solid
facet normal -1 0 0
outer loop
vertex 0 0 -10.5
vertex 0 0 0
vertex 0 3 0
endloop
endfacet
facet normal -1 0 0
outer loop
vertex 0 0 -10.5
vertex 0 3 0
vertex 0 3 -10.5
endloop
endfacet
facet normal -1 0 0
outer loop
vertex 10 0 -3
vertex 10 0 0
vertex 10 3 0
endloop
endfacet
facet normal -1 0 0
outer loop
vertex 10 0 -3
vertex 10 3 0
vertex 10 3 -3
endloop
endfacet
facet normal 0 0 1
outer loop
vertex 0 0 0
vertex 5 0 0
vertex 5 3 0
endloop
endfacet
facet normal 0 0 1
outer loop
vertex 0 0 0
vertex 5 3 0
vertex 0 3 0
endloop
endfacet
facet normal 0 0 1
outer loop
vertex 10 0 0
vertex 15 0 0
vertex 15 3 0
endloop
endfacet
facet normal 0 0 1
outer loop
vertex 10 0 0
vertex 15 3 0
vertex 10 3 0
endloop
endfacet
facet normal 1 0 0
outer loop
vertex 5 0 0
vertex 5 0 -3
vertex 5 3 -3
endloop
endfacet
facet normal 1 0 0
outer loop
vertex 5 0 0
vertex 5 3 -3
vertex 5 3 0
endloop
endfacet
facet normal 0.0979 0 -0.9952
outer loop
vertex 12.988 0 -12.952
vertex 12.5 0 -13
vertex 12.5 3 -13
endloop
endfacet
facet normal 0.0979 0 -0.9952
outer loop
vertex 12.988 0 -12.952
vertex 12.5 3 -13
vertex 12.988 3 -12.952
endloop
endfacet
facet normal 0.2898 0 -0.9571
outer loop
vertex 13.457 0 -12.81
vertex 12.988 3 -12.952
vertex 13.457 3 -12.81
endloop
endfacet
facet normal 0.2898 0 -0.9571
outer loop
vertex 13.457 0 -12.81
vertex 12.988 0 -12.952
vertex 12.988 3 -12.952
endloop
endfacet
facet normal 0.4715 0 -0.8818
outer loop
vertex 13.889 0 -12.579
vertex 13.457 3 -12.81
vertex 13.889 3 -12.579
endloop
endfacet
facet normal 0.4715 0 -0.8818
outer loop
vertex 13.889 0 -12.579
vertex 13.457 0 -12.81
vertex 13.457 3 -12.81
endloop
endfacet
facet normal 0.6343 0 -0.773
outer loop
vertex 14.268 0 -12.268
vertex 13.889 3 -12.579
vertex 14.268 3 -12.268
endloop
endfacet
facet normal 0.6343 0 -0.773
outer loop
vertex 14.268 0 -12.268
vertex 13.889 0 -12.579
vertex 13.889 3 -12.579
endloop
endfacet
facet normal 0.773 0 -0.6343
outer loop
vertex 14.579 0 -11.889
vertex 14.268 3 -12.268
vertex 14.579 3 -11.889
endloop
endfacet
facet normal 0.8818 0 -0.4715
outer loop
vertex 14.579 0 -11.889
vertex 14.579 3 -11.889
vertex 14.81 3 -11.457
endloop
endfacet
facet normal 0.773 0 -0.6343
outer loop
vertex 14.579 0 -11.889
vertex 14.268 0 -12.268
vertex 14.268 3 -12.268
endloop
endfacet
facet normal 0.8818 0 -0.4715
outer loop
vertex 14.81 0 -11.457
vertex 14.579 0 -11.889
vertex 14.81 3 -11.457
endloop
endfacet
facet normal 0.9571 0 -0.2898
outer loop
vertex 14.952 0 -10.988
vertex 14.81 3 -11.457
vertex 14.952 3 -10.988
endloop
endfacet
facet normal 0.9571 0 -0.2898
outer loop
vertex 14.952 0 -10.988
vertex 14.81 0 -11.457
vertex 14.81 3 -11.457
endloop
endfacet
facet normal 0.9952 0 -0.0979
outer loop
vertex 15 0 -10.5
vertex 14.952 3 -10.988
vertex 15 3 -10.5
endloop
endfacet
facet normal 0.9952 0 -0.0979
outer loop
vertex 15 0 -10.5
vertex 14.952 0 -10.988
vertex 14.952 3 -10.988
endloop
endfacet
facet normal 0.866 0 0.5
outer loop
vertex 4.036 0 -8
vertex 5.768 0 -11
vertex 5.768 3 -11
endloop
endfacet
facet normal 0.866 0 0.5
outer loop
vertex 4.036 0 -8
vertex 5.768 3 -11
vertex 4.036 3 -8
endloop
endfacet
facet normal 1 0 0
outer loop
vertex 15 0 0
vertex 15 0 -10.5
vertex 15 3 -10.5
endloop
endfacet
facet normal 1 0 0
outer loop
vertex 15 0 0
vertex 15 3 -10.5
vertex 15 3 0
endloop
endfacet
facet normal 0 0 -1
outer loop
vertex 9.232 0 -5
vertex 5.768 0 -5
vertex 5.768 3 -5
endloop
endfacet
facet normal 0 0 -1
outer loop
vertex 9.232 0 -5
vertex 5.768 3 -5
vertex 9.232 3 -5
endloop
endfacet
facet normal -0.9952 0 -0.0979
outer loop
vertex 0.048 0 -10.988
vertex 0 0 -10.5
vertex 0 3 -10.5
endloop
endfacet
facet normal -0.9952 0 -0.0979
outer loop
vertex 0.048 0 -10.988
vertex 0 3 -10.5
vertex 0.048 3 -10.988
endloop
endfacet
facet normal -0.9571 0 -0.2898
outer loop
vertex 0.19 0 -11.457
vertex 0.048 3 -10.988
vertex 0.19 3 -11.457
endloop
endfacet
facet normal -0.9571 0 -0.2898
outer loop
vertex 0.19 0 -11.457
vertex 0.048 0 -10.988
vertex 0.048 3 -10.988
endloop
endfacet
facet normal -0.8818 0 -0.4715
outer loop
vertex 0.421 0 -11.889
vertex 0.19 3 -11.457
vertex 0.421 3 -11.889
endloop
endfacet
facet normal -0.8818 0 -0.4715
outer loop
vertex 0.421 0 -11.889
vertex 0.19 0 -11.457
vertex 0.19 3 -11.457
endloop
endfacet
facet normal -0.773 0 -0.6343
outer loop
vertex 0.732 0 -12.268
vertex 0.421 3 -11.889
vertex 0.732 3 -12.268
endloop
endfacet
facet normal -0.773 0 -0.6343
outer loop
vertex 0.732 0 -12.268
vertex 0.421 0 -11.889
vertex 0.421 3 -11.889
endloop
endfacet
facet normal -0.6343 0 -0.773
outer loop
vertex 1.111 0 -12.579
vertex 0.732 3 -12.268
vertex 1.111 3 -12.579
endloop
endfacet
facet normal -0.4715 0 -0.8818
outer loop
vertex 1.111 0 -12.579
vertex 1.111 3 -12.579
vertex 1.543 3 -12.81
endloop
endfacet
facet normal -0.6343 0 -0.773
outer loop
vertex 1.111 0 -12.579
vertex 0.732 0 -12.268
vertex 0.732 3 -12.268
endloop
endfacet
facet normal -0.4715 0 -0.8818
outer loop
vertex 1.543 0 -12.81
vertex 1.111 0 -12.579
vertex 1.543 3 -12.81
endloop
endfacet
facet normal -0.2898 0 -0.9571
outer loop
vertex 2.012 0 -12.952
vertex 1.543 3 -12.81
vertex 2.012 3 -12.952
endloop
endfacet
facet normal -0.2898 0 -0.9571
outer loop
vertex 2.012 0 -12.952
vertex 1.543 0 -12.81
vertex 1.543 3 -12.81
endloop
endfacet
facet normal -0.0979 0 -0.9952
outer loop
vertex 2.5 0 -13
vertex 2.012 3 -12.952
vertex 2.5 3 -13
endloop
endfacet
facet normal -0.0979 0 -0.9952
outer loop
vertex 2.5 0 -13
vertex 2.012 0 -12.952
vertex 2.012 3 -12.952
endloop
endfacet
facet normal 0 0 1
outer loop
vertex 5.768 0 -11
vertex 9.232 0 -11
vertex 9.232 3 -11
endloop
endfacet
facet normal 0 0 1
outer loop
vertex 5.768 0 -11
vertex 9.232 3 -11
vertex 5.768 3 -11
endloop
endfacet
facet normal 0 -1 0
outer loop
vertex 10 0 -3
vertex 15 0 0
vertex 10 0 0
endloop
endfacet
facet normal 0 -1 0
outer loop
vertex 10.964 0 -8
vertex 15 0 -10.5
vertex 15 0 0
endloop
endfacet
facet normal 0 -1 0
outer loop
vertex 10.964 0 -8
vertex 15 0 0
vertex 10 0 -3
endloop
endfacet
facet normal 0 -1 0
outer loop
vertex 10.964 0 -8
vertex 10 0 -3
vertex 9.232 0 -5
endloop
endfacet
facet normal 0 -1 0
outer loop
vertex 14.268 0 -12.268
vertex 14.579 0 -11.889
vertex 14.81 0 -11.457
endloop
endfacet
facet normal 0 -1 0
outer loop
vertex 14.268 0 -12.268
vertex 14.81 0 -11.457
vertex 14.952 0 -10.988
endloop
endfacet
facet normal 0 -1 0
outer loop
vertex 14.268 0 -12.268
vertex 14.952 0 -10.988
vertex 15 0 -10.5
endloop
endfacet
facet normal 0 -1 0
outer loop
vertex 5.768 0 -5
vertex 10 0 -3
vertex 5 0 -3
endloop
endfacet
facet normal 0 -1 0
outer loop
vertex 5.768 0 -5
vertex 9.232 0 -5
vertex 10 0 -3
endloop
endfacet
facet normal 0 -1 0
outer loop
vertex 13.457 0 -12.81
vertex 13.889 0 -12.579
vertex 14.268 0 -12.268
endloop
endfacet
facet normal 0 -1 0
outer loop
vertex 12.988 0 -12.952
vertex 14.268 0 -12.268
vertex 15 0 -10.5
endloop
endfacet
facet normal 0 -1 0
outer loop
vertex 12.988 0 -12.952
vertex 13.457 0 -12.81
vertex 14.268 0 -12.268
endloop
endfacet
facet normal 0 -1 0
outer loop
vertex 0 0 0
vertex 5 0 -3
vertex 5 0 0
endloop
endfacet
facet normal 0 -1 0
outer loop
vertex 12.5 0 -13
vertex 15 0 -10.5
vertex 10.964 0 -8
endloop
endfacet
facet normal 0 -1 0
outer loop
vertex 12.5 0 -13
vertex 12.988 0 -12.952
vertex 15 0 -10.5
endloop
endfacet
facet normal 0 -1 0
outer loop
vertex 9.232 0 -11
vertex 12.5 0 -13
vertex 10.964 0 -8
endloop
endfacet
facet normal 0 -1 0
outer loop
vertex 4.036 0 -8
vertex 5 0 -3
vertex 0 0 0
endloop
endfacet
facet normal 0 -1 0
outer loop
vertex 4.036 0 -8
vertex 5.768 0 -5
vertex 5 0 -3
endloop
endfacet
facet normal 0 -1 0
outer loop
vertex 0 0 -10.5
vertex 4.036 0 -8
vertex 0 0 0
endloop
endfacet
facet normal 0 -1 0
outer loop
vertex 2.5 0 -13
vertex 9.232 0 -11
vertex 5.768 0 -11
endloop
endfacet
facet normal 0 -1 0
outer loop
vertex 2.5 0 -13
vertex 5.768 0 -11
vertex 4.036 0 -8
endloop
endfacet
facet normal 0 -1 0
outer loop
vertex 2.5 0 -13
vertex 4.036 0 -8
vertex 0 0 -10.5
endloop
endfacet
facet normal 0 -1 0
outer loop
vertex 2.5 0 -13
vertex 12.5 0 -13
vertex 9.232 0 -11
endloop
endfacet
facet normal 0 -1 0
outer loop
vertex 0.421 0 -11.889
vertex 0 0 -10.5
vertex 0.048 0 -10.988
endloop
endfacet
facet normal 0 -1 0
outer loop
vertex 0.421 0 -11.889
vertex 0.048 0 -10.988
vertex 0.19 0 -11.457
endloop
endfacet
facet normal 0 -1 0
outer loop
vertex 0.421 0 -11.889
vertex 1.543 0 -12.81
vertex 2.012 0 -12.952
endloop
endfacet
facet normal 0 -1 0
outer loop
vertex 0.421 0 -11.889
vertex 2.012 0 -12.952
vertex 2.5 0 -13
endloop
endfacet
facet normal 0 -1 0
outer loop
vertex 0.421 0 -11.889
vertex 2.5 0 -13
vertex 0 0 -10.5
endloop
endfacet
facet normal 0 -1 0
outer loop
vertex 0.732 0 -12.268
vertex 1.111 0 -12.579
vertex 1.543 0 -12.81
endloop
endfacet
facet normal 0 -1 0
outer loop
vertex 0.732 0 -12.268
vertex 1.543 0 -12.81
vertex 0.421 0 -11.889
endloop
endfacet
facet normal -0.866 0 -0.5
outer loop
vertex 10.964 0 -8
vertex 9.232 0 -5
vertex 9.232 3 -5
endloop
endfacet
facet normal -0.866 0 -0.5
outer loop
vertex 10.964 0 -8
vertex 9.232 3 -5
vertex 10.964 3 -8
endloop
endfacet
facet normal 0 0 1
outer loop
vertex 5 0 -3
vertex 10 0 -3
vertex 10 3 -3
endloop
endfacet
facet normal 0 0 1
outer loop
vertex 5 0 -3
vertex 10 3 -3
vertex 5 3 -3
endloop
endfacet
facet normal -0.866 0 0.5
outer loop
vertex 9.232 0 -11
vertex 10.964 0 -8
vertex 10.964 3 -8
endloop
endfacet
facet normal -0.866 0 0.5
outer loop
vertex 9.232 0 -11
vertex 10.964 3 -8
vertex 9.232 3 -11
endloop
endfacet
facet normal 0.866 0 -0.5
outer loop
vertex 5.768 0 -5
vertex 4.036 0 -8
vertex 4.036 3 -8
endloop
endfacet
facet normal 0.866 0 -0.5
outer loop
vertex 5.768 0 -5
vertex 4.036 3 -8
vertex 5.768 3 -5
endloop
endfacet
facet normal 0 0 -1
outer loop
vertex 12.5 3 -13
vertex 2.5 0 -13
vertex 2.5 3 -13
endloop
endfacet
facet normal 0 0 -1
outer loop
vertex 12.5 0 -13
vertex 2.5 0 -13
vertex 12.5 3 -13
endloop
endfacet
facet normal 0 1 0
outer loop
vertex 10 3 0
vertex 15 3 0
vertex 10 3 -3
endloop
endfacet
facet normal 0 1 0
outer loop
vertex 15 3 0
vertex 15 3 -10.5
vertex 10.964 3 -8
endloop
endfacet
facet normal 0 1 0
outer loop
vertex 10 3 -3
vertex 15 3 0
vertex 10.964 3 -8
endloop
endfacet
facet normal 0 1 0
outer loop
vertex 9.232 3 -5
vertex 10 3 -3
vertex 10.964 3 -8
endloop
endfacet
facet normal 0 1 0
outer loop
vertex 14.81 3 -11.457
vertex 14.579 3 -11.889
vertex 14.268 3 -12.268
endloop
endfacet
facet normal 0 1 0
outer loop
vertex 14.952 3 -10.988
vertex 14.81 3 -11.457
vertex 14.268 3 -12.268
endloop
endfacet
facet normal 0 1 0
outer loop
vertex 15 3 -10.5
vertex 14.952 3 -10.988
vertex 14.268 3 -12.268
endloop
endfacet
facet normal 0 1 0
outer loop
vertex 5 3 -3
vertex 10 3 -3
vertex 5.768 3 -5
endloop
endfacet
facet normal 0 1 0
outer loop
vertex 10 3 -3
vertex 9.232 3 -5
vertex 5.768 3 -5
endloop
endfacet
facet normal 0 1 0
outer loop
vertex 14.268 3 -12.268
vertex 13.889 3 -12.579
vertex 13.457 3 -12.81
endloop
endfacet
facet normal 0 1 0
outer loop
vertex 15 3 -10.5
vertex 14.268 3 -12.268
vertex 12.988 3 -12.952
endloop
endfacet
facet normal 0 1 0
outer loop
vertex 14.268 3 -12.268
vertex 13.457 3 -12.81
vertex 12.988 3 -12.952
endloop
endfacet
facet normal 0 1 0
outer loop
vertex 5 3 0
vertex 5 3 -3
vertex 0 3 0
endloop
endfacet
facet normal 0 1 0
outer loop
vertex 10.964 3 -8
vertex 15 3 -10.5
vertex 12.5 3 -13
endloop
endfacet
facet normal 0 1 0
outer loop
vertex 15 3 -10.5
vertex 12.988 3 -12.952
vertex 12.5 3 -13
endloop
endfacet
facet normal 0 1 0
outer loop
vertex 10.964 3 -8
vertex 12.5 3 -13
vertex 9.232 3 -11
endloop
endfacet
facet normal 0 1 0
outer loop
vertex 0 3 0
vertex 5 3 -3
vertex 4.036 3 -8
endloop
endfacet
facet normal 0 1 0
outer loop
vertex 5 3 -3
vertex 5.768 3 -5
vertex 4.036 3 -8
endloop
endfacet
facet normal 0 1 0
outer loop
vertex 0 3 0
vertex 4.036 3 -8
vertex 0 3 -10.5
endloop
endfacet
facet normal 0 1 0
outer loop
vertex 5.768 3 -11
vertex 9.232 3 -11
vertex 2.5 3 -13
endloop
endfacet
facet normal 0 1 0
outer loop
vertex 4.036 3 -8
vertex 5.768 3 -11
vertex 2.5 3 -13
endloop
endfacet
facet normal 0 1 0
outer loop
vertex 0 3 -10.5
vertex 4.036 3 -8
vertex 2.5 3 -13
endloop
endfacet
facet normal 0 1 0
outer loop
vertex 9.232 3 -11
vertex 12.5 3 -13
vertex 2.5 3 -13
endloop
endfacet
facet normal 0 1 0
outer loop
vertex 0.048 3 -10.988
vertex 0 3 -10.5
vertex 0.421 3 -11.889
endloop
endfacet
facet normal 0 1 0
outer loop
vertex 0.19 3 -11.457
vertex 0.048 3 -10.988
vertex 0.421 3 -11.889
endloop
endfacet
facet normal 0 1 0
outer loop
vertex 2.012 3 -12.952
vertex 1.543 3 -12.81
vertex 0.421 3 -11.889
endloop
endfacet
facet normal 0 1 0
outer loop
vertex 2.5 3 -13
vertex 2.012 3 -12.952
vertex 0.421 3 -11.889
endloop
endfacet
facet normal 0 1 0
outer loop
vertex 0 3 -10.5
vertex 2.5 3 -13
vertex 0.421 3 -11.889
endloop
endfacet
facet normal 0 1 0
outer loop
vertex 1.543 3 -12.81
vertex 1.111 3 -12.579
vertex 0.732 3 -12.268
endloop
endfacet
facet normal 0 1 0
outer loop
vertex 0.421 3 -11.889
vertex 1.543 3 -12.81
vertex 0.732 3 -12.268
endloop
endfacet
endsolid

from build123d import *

# Parameters (mm, degrees)
BOSS_EXTRUDE1_DEPTH = 3


with BuildPart() as part:
    # Sketch1 → Boss-Extrude1 (new body)
    with BuildSketch(Plane(origin=(0, 0, 0), x_dir=(1, 0, 0), z_dir=(0, 1, 0))):
        with BuildLine():
            Line((0, 0), (0, 10.5))
            ThreePointArc((0, 10.5), (0.732233047, 12.267766953), (2.5, 13))
            Line((2.5, 13), (12.5, 13))
            ThreePointArc((12.5, 13), (14.267766953, 12.267766953), (15, 10.5))
            Line((15, 10.5), (15, 0))
            Line((15, 0), (10, 0))
            Line((10, 0), (10, 3))
            Line((10, 3), (5, 3))
            Line((5, 3), (5, 0))
            Line((5, 0), (0, 0))
        make_face()
        Polygon((5.767949192, 5), (9.232050808, 5), (10.964101615, 8), (9.232050808, 11), (5.767949192, 11), (4.035898385, 8), align=None, mode=Mode.SUBTRACT)
    extrude(amount=BOSS_EXTRUDE1_DEPTH)


solid = part.part
